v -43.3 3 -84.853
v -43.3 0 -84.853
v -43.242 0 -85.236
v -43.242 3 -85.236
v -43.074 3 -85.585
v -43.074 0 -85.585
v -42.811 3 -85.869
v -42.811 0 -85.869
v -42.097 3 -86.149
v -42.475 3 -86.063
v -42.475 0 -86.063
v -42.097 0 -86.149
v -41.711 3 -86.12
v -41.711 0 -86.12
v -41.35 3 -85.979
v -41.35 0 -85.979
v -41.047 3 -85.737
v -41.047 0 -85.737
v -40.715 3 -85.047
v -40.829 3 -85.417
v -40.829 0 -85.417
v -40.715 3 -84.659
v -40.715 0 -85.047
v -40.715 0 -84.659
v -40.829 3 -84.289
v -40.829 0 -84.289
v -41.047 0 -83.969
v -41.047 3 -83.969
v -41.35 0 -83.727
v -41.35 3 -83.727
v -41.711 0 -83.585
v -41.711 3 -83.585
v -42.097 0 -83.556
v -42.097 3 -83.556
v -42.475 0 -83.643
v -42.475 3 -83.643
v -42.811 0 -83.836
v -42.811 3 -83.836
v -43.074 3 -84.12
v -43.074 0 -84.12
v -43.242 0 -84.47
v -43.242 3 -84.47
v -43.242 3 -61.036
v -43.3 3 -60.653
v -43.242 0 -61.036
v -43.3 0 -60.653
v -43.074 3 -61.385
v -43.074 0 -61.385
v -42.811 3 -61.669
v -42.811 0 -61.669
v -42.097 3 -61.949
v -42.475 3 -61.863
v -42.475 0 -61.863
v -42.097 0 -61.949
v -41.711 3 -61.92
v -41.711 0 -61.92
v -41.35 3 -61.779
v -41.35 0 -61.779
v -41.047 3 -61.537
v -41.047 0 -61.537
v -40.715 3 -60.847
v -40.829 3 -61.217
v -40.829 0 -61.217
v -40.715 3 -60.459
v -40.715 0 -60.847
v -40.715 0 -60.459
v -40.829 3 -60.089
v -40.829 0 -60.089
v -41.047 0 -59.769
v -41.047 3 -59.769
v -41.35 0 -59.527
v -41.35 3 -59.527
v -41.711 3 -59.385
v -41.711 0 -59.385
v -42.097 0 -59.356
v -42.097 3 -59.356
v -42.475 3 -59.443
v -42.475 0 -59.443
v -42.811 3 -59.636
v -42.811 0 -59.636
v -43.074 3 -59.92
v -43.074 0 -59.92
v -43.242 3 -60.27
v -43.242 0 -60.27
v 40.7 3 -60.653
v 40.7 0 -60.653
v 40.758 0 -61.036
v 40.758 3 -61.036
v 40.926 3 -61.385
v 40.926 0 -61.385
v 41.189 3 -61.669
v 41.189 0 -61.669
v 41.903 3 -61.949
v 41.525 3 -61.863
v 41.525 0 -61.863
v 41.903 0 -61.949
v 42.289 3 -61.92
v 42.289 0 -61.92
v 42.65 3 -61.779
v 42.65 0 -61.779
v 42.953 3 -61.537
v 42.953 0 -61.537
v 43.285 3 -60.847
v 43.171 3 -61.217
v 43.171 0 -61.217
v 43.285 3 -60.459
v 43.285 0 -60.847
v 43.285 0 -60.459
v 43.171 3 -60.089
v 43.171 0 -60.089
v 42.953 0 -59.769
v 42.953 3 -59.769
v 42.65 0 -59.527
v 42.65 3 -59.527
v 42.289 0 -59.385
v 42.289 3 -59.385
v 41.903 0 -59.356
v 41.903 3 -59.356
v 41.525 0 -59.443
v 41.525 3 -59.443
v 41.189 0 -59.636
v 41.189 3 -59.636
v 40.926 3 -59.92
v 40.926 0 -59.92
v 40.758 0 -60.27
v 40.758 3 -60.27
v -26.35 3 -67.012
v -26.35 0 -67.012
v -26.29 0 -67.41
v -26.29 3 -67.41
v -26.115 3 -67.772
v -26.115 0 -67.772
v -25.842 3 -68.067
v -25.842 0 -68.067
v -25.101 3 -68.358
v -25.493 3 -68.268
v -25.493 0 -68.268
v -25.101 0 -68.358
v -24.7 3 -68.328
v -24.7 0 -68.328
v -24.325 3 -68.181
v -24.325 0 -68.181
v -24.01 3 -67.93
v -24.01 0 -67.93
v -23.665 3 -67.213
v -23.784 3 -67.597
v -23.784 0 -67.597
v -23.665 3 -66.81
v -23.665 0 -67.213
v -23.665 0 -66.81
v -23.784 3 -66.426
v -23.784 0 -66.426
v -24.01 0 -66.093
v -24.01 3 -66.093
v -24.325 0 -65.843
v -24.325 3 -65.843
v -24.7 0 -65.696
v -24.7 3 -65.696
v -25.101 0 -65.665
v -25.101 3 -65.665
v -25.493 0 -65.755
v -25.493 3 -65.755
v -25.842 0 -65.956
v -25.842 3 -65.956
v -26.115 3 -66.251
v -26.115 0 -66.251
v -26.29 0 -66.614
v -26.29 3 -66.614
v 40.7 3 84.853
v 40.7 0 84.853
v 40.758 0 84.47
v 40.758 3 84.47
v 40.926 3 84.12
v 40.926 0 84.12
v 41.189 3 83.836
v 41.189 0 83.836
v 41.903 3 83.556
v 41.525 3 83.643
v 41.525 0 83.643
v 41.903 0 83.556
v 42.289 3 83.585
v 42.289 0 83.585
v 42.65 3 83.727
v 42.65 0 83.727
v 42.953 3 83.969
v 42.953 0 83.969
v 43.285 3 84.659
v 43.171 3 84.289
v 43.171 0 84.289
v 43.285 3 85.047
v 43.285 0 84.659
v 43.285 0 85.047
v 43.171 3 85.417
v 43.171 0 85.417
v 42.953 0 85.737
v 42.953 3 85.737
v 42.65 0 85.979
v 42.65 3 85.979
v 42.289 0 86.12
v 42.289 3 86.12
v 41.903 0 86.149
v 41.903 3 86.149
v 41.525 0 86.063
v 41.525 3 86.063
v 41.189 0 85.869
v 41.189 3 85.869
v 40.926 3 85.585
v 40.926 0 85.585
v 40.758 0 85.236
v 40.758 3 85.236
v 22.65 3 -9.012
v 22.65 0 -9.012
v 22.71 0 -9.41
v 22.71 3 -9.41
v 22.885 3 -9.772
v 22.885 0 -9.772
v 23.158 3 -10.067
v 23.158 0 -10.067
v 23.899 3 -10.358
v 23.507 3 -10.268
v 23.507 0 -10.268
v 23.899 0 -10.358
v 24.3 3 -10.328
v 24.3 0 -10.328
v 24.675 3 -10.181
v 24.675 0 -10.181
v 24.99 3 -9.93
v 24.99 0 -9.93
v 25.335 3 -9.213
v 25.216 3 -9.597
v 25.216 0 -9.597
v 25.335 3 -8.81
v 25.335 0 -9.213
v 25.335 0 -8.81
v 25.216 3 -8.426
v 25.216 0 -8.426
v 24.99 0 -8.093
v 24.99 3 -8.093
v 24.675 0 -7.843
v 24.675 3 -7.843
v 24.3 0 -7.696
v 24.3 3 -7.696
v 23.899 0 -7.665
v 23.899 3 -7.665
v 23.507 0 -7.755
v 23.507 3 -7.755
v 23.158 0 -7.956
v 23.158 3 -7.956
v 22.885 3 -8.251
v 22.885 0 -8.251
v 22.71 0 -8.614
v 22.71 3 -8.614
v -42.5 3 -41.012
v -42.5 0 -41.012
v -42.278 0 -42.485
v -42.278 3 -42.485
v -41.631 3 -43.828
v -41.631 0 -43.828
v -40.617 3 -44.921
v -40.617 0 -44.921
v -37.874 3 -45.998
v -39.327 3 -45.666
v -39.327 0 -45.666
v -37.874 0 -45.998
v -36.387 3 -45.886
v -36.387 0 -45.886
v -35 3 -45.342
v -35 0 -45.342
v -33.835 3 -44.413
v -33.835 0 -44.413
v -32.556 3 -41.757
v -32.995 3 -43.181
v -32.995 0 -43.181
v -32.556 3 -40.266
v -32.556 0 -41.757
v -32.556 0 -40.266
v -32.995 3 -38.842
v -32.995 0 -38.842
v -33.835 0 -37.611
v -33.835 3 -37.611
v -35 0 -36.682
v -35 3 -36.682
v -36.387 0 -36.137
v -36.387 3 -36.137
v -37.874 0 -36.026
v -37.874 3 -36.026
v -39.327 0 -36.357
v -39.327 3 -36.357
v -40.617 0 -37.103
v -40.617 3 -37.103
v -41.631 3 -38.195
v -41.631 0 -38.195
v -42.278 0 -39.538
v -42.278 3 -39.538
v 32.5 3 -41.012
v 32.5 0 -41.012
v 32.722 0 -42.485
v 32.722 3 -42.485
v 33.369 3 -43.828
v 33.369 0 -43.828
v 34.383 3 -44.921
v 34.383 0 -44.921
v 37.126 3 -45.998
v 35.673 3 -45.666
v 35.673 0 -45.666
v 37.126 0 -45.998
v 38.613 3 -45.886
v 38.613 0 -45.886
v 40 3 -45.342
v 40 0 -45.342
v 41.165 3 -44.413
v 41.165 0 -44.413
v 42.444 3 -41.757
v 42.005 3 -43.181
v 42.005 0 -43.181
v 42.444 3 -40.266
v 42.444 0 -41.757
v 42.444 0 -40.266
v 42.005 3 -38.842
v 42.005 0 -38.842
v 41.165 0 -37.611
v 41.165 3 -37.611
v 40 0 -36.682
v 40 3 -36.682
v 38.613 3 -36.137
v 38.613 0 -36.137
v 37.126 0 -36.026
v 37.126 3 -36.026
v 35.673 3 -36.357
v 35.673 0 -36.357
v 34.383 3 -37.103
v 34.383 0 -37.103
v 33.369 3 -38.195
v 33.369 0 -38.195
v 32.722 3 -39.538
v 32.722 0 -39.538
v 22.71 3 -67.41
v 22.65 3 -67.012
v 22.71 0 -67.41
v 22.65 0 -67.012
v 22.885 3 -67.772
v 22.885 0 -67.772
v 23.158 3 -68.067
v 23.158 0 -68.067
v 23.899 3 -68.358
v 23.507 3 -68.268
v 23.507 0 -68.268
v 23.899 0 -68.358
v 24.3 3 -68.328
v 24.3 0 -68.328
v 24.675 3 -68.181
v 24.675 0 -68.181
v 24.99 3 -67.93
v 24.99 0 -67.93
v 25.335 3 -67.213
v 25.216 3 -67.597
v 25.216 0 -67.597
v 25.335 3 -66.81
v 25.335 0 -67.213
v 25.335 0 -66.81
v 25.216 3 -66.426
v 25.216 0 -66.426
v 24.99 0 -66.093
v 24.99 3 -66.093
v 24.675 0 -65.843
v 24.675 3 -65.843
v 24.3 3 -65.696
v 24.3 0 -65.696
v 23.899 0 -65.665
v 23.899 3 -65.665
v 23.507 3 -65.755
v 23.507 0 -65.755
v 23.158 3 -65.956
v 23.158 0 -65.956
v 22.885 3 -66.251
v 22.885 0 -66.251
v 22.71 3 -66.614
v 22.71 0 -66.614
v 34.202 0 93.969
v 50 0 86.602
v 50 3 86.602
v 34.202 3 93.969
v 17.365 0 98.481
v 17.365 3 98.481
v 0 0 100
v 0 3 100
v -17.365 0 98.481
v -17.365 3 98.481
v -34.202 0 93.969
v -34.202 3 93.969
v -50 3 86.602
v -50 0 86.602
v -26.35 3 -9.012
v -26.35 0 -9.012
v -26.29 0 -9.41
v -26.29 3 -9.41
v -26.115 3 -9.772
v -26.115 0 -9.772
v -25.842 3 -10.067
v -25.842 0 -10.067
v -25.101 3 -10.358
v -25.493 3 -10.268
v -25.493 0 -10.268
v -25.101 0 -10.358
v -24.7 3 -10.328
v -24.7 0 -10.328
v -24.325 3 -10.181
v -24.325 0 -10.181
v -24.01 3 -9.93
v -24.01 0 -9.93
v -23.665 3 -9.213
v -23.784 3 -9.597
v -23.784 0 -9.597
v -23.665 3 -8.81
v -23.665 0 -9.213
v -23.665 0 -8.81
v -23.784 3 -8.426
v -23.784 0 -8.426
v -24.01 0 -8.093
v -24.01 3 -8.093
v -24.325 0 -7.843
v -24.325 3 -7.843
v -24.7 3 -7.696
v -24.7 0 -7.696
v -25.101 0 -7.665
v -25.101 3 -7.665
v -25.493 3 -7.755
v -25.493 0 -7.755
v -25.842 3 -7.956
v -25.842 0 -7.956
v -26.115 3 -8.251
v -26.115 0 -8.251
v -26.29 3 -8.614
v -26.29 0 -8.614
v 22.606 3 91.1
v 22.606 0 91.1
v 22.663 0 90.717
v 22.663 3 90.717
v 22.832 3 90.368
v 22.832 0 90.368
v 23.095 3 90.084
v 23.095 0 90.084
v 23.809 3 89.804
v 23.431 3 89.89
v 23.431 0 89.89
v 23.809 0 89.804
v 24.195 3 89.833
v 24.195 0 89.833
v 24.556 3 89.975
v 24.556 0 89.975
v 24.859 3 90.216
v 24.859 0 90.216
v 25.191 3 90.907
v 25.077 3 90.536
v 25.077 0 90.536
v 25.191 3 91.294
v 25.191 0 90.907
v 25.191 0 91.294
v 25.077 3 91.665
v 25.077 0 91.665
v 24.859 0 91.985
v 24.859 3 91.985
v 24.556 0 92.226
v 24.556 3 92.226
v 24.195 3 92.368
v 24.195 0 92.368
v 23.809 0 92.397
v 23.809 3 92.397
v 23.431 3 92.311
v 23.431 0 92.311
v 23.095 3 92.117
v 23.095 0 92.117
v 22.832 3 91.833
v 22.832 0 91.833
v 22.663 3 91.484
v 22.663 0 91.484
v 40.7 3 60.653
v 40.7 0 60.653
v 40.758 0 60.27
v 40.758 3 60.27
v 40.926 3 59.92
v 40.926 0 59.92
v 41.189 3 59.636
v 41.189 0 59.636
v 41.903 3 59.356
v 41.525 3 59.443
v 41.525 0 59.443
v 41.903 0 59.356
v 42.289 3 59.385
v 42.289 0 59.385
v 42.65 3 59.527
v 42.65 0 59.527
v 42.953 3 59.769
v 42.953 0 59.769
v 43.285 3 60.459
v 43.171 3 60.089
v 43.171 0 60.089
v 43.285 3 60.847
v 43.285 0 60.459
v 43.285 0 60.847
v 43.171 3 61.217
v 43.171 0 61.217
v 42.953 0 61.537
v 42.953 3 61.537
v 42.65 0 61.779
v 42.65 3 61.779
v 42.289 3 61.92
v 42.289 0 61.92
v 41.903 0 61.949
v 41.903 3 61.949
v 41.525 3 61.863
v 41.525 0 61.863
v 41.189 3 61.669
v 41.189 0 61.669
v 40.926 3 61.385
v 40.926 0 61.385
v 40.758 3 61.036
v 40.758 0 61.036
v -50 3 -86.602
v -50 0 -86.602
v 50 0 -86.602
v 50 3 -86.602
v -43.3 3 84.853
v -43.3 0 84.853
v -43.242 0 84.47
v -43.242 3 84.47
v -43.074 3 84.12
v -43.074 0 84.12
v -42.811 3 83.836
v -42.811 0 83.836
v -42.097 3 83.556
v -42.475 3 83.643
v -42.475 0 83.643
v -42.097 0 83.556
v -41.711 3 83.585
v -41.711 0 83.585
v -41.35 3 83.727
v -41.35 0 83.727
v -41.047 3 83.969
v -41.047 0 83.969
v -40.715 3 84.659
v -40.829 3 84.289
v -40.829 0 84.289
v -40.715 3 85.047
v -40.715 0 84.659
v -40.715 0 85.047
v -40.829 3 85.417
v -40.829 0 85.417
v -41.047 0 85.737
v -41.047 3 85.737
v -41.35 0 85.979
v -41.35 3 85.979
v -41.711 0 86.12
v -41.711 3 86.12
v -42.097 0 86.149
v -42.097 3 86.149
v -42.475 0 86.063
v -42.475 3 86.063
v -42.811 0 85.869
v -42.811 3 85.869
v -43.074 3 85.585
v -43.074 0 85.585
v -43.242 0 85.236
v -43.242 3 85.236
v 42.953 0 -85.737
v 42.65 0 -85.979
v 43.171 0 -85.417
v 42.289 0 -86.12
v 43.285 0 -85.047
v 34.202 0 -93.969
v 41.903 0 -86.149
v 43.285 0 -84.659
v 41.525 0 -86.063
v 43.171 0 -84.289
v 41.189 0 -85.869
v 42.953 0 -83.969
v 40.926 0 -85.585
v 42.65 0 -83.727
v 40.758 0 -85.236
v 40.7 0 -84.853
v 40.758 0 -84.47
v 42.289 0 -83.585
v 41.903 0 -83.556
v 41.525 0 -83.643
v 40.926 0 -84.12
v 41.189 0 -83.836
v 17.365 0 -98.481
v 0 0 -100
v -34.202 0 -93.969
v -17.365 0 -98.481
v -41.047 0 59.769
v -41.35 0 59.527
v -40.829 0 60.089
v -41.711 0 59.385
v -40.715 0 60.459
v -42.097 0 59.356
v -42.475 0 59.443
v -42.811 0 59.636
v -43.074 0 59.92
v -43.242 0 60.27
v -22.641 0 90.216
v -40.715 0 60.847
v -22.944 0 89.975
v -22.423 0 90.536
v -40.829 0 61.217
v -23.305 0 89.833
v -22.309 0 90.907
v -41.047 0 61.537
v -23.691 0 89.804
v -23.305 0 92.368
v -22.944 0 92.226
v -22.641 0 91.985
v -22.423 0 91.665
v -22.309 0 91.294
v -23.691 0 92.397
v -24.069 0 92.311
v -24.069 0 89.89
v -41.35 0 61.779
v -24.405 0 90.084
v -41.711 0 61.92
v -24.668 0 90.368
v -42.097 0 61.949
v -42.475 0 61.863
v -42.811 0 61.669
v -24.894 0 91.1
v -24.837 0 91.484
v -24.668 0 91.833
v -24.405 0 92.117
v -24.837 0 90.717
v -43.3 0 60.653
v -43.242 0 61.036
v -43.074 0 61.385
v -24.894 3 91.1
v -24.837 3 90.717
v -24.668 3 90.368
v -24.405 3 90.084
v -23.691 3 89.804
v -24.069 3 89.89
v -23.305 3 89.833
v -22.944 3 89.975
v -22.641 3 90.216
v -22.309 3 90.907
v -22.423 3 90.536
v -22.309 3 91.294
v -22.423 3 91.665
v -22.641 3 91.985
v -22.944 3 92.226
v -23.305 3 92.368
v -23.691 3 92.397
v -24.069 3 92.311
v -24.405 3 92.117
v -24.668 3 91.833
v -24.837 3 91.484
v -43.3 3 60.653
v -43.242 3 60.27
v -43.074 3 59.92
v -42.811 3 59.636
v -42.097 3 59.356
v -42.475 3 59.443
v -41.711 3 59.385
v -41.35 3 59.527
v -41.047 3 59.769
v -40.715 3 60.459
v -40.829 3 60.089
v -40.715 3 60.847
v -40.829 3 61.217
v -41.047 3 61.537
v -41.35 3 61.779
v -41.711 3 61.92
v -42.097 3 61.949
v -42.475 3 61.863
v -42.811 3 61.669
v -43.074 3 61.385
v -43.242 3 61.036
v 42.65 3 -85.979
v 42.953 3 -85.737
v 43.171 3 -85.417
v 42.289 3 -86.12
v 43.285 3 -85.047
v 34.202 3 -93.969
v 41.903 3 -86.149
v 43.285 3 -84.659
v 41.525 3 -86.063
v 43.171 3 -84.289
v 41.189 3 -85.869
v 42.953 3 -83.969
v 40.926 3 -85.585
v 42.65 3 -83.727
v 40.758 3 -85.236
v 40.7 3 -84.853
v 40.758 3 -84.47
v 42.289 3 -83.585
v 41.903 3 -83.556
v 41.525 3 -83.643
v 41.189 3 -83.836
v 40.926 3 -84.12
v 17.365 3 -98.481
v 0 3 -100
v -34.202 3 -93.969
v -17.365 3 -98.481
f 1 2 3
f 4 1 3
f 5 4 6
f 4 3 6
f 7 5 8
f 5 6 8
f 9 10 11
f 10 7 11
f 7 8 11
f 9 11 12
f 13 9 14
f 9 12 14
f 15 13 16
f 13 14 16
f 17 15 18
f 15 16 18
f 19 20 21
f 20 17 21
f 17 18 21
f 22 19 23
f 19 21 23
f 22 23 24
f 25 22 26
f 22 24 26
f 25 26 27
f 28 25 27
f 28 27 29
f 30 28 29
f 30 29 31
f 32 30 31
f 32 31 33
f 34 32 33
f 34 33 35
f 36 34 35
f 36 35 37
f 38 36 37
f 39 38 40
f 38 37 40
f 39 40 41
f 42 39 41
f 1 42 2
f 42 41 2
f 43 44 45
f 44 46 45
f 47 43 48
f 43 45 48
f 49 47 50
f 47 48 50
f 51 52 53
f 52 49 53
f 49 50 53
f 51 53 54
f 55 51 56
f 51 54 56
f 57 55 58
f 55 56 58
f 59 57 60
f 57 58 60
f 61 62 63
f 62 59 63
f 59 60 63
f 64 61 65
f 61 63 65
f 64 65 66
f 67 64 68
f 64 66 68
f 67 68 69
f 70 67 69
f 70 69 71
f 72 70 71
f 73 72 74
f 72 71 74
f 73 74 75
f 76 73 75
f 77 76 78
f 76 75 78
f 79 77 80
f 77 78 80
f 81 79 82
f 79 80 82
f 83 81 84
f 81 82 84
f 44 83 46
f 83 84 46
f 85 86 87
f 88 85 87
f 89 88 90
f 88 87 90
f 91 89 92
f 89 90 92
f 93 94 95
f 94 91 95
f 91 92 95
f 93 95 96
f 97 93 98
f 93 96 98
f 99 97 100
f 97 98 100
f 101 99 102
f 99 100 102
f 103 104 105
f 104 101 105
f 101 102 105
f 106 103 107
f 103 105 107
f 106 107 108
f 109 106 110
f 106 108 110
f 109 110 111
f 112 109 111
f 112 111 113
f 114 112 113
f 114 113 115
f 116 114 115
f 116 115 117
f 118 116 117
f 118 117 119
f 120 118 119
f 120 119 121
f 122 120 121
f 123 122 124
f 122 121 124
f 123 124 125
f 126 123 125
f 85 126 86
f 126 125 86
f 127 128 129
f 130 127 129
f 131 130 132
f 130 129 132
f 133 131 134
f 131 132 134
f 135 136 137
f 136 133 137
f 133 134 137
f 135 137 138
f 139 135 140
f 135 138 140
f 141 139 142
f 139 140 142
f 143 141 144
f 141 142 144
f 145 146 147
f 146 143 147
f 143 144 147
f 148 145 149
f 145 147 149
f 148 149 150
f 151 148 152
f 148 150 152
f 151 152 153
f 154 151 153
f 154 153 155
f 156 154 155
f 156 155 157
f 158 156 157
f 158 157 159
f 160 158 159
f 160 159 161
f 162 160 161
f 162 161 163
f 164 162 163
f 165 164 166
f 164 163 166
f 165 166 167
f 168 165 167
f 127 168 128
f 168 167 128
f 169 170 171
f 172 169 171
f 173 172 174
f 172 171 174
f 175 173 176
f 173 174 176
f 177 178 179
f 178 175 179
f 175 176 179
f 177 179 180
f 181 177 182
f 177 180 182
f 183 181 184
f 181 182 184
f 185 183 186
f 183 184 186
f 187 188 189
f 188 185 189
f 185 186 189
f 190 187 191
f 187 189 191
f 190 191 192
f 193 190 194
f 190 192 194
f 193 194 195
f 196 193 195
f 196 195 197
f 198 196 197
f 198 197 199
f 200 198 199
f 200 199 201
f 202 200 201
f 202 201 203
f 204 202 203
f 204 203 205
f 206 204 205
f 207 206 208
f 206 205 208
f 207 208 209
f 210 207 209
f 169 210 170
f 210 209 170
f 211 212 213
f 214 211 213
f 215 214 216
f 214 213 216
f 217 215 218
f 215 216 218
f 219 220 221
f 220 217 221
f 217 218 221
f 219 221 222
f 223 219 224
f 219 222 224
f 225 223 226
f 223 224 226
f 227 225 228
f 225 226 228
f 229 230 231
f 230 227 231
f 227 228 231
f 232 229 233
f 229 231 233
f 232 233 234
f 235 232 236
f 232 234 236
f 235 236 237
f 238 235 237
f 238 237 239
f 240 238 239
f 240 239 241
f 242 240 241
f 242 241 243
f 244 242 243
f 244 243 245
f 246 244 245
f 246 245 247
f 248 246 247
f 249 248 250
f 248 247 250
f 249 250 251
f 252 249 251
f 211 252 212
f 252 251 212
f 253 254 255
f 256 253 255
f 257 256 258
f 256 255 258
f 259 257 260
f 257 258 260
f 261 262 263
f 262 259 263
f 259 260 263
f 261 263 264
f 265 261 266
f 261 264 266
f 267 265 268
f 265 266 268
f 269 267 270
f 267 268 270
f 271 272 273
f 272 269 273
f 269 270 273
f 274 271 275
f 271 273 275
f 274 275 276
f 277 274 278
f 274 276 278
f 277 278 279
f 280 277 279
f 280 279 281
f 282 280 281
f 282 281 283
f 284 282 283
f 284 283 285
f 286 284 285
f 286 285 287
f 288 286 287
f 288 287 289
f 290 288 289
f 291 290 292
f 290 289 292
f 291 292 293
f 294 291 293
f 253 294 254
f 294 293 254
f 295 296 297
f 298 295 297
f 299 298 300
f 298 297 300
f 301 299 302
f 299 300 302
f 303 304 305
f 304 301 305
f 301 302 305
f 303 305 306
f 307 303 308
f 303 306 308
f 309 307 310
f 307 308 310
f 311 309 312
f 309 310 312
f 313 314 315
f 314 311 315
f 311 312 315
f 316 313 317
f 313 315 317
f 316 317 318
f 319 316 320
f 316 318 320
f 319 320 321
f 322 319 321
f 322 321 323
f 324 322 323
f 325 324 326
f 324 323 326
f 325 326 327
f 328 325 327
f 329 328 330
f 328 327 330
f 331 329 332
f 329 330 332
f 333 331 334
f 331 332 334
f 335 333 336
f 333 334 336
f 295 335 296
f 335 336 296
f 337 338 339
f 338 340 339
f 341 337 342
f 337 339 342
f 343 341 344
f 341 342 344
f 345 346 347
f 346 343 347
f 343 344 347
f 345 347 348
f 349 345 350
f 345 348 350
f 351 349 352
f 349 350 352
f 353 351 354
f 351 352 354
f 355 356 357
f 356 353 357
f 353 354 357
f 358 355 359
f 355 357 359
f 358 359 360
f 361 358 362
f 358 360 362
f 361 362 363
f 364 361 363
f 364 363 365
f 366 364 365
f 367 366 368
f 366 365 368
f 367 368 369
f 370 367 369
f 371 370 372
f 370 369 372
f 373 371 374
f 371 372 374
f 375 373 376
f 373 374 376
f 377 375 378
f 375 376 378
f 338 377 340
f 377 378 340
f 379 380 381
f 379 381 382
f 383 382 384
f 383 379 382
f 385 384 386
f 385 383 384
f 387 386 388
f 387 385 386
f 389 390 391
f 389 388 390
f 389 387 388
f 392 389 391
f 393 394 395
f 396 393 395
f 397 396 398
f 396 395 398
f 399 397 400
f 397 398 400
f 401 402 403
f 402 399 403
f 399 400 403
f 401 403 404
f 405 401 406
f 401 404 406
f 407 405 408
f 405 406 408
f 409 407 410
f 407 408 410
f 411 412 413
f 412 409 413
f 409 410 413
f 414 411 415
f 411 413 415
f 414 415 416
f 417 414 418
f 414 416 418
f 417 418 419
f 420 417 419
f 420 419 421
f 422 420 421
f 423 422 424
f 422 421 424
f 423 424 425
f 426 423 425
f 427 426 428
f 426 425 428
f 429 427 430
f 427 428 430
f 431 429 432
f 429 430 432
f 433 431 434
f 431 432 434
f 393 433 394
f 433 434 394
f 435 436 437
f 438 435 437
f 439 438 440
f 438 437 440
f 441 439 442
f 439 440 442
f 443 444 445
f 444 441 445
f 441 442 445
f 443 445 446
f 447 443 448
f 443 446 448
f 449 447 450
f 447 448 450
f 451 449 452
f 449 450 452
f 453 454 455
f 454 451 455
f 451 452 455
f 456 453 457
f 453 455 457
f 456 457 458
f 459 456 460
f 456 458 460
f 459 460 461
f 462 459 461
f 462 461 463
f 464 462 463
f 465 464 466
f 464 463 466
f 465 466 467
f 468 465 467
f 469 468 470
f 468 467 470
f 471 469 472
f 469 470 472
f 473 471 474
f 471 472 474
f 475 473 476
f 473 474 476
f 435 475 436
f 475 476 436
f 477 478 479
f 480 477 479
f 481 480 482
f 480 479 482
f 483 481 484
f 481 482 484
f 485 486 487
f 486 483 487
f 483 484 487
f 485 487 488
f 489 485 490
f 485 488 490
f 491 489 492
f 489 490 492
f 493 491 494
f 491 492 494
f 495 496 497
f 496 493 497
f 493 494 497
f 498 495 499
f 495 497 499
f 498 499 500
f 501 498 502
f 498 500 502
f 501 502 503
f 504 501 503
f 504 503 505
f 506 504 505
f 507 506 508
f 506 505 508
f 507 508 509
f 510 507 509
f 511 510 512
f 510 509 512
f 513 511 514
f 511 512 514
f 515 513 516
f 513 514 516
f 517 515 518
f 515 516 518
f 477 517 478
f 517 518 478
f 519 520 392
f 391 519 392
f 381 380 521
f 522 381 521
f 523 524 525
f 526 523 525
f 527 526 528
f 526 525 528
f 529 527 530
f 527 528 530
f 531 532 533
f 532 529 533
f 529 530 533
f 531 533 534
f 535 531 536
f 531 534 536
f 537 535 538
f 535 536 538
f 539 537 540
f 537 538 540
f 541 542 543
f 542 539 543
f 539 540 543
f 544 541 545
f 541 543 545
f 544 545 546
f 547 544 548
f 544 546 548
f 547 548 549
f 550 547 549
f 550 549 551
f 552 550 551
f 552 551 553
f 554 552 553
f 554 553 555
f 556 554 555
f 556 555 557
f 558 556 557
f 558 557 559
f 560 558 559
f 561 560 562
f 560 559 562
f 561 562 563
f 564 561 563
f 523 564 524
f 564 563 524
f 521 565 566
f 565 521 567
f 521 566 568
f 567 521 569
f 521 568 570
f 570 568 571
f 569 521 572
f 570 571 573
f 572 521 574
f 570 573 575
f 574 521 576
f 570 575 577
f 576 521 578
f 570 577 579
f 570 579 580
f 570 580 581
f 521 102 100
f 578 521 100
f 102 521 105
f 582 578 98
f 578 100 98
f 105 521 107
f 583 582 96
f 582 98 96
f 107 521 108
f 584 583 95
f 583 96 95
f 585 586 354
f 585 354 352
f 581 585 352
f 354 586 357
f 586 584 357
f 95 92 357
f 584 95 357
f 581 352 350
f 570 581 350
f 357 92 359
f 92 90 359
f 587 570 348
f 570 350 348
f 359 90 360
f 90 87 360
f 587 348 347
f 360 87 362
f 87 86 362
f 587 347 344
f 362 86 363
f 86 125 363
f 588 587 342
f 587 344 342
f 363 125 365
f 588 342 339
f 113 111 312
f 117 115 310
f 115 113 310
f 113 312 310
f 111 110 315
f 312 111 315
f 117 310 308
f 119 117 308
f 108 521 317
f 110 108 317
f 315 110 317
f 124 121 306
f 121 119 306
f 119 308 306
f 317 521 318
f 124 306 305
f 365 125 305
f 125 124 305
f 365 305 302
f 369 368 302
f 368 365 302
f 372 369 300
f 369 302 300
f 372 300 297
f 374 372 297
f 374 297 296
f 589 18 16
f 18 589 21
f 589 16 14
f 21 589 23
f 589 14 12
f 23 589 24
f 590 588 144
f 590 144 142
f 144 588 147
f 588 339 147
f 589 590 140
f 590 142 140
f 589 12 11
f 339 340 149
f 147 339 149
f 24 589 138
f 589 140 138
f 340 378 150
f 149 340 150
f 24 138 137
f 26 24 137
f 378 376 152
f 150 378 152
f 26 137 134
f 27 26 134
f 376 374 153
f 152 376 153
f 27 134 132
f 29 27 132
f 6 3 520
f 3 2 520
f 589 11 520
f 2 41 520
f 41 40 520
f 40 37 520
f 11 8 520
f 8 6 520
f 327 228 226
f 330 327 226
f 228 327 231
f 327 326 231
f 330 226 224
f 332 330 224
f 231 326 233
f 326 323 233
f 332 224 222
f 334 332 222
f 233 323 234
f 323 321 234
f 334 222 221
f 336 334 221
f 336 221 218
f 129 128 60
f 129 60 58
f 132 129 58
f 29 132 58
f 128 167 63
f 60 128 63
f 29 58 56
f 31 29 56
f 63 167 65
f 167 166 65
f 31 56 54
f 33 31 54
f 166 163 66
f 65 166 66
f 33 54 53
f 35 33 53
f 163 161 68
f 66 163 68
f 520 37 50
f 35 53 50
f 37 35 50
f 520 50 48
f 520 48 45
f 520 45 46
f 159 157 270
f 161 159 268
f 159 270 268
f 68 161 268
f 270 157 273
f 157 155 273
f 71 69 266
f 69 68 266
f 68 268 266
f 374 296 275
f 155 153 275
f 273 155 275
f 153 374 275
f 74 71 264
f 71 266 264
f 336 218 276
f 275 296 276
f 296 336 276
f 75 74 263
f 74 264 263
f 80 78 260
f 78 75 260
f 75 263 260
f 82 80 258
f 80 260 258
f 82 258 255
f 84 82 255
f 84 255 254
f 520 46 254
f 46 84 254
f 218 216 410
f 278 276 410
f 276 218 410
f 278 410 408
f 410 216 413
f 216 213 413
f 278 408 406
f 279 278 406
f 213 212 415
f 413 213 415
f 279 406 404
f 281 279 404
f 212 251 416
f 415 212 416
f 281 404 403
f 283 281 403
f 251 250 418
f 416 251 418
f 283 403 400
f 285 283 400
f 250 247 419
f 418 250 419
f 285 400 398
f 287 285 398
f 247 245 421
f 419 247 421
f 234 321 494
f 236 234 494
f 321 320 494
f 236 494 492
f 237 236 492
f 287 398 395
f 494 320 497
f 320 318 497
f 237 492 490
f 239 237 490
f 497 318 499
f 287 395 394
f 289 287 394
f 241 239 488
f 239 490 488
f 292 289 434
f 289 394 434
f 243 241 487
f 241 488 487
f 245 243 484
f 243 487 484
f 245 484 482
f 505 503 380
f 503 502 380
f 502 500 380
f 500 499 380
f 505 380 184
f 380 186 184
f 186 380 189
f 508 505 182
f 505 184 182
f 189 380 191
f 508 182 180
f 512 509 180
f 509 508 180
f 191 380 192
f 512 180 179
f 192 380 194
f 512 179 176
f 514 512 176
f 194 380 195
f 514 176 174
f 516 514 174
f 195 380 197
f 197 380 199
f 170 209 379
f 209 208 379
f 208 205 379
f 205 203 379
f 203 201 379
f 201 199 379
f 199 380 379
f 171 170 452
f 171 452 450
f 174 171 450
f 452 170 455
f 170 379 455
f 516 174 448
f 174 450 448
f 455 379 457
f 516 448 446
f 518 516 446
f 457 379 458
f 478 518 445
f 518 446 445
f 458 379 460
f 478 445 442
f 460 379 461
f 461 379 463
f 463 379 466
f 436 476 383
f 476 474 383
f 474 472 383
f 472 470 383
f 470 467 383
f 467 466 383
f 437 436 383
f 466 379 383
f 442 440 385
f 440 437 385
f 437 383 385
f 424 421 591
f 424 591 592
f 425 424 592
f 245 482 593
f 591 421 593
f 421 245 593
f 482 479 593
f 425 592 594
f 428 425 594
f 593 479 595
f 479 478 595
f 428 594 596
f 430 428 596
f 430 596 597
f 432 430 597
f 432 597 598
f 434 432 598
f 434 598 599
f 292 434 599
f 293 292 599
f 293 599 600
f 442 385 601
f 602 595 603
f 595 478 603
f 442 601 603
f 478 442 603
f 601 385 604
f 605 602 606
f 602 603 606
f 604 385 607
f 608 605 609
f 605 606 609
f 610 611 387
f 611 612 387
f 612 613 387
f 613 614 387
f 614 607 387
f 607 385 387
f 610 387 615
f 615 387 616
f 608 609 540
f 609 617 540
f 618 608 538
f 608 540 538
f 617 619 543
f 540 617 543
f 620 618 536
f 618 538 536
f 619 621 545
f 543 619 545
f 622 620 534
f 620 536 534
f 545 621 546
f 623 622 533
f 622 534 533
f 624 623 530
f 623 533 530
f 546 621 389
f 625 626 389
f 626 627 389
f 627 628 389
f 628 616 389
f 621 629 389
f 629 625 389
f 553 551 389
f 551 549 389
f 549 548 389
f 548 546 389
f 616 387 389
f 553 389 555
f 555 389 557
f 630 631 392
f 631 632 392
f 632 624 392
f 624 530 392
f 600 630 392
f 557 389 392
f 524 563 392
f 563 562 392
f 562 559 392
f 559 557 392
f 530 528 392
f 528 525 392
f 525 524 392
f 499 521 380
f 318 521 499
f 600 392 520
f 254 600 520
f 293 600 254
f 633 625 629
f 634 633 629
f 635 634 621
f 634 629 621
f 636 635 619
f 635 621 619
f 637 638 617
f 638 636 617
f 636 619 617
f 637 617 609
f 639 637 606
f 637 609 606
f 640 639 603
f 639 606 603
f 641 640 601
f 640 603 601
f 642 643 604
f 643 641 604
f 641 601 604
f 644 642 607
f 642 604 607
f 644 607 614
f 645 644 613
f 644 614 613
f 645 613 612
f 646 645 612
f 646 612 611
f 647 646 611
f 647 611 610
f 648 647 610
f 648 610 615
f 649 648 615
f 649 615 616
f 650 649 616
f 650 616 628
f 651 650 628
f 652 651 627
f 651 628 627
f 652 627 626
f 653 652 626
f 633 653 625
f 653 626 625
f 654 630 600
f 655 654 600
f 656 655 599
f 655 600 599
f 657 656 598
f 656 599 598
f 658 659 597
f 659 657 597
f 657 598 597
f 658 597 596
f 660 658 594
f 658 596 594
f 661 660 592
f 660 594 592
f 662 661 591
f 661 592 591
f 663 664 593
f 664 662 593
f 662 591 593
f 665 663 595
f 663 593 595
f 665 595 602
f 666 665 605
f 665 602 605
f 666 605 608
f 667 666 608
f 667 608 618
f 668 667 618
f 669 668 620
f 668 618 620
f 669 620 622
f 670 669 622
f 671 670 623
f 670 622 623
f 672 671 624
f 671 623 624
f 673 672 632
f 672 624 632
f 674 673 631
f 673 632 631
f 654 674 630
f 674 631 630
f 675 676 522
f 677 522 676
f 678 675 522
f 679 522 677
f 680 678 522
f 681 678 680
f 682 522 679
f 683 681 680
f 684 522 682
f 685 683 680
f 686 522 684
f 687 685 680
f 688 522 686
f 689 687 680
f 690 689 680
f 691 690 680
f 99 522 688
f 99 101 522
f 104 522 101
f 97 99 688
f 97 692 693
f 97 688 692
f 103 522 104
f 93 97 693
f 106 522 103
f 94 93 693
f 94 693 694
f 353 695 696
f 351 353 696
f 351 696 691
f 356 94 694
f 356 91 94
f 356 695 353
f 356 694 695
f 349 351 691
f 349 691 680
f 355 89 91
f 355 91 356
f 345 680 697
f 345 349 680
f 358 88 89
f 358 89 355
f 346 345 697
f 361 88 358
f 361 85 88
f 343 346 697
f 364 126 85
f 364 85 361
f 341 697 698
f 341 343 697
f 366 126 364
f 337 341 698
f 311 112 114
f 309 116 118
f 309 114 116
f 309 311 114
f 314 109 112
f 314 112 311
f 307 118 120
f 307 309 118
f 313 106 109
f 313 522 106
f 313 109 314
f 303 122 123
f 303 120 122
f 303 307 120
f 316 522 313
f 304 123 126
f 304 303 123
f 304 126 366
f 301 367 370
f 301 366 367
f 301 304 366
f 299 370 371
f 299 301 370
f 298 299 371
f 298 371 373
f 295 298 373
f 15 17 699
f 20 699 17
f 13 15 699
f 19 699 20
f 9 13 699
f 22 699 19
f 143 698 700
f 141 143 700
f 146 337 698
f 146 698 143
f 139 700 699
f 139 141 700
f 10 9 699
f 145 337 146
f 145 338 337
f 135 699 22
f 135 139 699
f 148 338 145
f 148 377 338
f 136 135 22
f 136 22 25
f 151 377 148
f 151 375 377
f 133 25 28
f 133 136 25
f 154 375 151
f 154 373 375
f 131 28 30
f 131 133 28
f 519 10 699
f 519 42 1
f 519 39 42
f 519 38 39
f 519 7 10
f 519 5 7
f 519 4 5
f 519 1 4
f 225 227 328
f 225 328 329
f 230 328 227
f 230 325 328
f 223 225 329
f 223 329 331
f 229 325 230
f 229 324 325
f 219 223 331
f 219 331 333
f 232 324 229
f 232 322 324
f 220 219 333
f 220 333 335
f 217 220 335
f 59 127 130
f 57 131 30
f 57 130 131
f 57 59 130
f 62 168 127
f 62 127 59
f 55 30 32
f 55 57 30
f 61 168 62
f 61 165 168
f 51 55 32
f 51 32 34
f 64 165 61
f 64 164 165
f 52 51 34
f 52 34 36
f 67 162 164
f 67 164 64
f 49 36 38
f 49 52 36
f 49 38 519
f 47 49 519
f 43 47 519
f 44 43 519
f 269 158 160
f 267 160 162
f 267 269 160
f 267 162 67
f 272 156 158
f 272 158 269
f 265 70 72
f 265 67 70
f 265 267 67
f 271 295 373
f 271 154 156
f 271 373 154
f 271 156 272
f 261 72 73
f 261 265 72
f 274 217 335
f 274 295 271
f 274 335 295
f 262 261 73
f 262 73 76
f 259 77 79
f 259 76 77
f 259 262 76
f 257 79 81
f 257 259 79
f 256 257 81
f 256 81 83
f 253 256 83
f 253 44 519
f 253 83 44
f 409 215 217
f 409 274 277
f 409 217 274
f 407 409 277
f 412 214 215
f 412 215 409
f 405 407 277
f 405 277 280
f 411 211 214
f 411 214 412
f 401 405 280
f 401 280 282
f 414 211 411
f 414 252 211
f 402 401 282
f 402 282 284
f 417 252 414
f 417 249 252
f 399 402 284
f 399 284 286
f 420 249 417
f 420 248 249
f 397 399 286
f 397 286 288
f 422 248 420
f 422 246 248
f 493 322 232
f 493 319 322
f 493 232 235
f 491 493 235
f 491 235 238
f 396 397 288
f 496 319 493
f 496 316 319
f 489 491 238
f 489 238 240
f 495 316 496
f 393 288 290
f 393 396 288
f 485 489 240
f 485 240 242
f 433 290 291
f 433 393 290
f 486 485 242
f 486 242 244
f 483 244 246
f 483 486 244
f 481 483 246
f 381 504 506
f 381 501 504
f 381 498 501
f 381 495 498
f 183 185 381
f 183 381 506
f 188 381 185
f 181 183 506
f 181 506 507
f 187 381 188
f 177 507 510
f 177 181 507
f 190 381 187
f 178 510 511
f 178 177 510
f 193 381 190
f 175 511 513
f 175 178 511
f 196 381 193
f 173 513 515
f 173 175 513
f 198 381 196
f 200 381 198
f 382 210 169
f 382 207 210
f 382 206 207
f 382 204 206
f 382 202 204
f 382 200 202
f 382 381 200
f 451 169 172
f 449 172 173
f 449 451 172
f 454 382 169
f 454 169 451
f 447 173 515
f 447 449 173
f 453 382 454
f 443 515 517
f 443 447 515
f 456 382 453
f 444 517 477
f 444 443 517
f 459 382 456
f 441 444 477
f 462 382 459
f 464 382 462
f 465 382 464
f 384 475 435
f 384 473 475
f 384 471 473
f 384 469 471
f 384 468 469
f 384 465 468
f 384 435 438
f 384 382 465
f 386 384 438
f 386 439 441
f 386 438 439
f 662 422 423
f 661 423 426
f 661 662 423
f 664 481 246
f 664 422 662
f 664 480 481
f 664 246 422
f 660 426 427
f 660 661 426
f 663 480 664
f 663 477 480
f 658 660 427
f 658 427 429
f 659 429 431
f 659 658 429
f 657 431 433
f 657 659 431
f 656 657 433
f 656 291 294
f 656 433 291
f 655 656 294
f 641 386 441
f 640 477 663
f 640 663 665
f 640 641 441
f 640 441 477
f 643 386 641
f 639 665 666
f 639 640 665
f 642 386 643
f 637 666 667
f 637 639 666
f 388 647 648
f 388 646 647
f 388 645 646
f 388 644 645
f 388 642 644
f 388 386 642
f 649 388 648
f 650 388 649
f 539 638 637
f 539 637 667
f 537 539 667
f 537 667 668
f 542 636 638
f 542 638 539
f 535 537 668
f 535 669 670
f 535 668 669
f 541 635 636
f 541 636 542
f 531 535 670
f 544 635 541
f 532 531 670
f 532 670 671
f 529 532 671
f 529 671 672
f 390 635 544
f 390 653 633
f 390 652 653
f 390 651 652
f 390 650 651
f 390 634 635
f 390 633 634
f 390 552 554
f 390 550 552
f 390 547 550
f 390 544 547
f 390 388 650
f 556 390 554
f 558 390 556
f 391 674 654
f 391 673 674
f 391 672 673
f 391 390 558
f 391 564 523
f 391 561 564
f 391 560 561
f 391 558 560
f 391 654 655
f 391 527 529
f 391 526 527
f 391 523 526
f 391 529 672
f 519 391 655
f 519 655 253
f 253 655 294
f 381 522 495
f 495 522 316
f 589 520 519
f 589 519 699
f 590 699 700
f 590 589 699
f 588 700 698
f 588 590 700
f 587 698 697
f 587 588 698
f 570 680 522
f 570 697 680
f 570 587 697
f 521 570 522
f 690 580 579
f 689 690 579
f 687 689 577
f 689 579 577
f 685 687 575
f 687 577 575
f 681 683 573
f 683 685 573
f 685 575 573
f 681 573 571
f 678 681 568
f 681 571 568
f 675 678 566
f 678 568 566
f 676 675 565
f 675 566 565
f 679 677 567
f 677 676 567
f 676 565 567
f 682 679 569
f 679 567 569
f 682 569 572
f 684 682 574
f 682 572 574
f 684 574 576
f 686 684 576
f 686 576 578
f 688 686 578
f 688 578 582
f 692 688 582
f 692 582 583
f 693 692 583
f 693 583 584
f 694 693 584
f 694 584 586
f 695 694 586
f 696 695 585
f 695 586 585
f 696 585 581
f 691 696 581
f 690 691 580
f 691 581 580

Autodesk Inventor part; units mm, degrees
ref_plane "YZ Plane" through (0, 0, 0) normal (1, 0, 0) x (0, 1, 0)
ref_plane "XZ Plane" through (0, 0, 0) normal (0, 1, 0) x (-1, 0, 0)
ref_plane "XY Plane" through (0, 0, 0) normal (0, 0, 1) x (1, 0, 0)
sketch "Sketch1" plane through (0, 0, 0) normal (0, 1, 0) x (-1, 0, 0)
  line L0 (-50, 86.6025) -> (-50, -86.6025)
  line L1 (50, -86.6025) -> (50, 86.6025)
  arc A0 (50, 86.6025) -> (-50, 86.6025) centre (0, 0) ccw
  arc A1 (-50, -86.6025) -> (50, -86.6025) centre (0, 0) ccw
  circle A2 centre (25, -67.0117) radius 1.35
  circle A3 centre (25, -9.0117) radius 1.35
  circle A4 centre (-24, -9.0117) radius 1.35
  circle A5 centre (-24, -67.0117) radius 1.35
  circle A6 centre (42, -84.8528) radius 1.3
  circle A7 centre (42, -60.6528) radius 1.3
  circle A8 centre (-42, -84.8528) radius 1.3
  circle A9 centre (-42, -60.6528) radius 1.3
  circle A10 centre (42, 84.8528) radius 1.3
  circle A11 centre (42, 60.6528) radius 1.3
  circle A12 centre (-42, 84.8528) radius 1.3
  circle A13 centre (-42, 60.6528) radius 1.3
  circle A14 centre (23.5943, 91.1005) radius 1.3
  circle A15 centre (-23.9057, 91.1005) radius 1.3
  circle A16 centre (37.5, -41.0117) radius 5
  circle A17 centre (-37.5, -41.0117) radius 5
extrude "Extrusion1" add sketch "Sketch1" along normal blind 3
properties part number "basePlate3"
